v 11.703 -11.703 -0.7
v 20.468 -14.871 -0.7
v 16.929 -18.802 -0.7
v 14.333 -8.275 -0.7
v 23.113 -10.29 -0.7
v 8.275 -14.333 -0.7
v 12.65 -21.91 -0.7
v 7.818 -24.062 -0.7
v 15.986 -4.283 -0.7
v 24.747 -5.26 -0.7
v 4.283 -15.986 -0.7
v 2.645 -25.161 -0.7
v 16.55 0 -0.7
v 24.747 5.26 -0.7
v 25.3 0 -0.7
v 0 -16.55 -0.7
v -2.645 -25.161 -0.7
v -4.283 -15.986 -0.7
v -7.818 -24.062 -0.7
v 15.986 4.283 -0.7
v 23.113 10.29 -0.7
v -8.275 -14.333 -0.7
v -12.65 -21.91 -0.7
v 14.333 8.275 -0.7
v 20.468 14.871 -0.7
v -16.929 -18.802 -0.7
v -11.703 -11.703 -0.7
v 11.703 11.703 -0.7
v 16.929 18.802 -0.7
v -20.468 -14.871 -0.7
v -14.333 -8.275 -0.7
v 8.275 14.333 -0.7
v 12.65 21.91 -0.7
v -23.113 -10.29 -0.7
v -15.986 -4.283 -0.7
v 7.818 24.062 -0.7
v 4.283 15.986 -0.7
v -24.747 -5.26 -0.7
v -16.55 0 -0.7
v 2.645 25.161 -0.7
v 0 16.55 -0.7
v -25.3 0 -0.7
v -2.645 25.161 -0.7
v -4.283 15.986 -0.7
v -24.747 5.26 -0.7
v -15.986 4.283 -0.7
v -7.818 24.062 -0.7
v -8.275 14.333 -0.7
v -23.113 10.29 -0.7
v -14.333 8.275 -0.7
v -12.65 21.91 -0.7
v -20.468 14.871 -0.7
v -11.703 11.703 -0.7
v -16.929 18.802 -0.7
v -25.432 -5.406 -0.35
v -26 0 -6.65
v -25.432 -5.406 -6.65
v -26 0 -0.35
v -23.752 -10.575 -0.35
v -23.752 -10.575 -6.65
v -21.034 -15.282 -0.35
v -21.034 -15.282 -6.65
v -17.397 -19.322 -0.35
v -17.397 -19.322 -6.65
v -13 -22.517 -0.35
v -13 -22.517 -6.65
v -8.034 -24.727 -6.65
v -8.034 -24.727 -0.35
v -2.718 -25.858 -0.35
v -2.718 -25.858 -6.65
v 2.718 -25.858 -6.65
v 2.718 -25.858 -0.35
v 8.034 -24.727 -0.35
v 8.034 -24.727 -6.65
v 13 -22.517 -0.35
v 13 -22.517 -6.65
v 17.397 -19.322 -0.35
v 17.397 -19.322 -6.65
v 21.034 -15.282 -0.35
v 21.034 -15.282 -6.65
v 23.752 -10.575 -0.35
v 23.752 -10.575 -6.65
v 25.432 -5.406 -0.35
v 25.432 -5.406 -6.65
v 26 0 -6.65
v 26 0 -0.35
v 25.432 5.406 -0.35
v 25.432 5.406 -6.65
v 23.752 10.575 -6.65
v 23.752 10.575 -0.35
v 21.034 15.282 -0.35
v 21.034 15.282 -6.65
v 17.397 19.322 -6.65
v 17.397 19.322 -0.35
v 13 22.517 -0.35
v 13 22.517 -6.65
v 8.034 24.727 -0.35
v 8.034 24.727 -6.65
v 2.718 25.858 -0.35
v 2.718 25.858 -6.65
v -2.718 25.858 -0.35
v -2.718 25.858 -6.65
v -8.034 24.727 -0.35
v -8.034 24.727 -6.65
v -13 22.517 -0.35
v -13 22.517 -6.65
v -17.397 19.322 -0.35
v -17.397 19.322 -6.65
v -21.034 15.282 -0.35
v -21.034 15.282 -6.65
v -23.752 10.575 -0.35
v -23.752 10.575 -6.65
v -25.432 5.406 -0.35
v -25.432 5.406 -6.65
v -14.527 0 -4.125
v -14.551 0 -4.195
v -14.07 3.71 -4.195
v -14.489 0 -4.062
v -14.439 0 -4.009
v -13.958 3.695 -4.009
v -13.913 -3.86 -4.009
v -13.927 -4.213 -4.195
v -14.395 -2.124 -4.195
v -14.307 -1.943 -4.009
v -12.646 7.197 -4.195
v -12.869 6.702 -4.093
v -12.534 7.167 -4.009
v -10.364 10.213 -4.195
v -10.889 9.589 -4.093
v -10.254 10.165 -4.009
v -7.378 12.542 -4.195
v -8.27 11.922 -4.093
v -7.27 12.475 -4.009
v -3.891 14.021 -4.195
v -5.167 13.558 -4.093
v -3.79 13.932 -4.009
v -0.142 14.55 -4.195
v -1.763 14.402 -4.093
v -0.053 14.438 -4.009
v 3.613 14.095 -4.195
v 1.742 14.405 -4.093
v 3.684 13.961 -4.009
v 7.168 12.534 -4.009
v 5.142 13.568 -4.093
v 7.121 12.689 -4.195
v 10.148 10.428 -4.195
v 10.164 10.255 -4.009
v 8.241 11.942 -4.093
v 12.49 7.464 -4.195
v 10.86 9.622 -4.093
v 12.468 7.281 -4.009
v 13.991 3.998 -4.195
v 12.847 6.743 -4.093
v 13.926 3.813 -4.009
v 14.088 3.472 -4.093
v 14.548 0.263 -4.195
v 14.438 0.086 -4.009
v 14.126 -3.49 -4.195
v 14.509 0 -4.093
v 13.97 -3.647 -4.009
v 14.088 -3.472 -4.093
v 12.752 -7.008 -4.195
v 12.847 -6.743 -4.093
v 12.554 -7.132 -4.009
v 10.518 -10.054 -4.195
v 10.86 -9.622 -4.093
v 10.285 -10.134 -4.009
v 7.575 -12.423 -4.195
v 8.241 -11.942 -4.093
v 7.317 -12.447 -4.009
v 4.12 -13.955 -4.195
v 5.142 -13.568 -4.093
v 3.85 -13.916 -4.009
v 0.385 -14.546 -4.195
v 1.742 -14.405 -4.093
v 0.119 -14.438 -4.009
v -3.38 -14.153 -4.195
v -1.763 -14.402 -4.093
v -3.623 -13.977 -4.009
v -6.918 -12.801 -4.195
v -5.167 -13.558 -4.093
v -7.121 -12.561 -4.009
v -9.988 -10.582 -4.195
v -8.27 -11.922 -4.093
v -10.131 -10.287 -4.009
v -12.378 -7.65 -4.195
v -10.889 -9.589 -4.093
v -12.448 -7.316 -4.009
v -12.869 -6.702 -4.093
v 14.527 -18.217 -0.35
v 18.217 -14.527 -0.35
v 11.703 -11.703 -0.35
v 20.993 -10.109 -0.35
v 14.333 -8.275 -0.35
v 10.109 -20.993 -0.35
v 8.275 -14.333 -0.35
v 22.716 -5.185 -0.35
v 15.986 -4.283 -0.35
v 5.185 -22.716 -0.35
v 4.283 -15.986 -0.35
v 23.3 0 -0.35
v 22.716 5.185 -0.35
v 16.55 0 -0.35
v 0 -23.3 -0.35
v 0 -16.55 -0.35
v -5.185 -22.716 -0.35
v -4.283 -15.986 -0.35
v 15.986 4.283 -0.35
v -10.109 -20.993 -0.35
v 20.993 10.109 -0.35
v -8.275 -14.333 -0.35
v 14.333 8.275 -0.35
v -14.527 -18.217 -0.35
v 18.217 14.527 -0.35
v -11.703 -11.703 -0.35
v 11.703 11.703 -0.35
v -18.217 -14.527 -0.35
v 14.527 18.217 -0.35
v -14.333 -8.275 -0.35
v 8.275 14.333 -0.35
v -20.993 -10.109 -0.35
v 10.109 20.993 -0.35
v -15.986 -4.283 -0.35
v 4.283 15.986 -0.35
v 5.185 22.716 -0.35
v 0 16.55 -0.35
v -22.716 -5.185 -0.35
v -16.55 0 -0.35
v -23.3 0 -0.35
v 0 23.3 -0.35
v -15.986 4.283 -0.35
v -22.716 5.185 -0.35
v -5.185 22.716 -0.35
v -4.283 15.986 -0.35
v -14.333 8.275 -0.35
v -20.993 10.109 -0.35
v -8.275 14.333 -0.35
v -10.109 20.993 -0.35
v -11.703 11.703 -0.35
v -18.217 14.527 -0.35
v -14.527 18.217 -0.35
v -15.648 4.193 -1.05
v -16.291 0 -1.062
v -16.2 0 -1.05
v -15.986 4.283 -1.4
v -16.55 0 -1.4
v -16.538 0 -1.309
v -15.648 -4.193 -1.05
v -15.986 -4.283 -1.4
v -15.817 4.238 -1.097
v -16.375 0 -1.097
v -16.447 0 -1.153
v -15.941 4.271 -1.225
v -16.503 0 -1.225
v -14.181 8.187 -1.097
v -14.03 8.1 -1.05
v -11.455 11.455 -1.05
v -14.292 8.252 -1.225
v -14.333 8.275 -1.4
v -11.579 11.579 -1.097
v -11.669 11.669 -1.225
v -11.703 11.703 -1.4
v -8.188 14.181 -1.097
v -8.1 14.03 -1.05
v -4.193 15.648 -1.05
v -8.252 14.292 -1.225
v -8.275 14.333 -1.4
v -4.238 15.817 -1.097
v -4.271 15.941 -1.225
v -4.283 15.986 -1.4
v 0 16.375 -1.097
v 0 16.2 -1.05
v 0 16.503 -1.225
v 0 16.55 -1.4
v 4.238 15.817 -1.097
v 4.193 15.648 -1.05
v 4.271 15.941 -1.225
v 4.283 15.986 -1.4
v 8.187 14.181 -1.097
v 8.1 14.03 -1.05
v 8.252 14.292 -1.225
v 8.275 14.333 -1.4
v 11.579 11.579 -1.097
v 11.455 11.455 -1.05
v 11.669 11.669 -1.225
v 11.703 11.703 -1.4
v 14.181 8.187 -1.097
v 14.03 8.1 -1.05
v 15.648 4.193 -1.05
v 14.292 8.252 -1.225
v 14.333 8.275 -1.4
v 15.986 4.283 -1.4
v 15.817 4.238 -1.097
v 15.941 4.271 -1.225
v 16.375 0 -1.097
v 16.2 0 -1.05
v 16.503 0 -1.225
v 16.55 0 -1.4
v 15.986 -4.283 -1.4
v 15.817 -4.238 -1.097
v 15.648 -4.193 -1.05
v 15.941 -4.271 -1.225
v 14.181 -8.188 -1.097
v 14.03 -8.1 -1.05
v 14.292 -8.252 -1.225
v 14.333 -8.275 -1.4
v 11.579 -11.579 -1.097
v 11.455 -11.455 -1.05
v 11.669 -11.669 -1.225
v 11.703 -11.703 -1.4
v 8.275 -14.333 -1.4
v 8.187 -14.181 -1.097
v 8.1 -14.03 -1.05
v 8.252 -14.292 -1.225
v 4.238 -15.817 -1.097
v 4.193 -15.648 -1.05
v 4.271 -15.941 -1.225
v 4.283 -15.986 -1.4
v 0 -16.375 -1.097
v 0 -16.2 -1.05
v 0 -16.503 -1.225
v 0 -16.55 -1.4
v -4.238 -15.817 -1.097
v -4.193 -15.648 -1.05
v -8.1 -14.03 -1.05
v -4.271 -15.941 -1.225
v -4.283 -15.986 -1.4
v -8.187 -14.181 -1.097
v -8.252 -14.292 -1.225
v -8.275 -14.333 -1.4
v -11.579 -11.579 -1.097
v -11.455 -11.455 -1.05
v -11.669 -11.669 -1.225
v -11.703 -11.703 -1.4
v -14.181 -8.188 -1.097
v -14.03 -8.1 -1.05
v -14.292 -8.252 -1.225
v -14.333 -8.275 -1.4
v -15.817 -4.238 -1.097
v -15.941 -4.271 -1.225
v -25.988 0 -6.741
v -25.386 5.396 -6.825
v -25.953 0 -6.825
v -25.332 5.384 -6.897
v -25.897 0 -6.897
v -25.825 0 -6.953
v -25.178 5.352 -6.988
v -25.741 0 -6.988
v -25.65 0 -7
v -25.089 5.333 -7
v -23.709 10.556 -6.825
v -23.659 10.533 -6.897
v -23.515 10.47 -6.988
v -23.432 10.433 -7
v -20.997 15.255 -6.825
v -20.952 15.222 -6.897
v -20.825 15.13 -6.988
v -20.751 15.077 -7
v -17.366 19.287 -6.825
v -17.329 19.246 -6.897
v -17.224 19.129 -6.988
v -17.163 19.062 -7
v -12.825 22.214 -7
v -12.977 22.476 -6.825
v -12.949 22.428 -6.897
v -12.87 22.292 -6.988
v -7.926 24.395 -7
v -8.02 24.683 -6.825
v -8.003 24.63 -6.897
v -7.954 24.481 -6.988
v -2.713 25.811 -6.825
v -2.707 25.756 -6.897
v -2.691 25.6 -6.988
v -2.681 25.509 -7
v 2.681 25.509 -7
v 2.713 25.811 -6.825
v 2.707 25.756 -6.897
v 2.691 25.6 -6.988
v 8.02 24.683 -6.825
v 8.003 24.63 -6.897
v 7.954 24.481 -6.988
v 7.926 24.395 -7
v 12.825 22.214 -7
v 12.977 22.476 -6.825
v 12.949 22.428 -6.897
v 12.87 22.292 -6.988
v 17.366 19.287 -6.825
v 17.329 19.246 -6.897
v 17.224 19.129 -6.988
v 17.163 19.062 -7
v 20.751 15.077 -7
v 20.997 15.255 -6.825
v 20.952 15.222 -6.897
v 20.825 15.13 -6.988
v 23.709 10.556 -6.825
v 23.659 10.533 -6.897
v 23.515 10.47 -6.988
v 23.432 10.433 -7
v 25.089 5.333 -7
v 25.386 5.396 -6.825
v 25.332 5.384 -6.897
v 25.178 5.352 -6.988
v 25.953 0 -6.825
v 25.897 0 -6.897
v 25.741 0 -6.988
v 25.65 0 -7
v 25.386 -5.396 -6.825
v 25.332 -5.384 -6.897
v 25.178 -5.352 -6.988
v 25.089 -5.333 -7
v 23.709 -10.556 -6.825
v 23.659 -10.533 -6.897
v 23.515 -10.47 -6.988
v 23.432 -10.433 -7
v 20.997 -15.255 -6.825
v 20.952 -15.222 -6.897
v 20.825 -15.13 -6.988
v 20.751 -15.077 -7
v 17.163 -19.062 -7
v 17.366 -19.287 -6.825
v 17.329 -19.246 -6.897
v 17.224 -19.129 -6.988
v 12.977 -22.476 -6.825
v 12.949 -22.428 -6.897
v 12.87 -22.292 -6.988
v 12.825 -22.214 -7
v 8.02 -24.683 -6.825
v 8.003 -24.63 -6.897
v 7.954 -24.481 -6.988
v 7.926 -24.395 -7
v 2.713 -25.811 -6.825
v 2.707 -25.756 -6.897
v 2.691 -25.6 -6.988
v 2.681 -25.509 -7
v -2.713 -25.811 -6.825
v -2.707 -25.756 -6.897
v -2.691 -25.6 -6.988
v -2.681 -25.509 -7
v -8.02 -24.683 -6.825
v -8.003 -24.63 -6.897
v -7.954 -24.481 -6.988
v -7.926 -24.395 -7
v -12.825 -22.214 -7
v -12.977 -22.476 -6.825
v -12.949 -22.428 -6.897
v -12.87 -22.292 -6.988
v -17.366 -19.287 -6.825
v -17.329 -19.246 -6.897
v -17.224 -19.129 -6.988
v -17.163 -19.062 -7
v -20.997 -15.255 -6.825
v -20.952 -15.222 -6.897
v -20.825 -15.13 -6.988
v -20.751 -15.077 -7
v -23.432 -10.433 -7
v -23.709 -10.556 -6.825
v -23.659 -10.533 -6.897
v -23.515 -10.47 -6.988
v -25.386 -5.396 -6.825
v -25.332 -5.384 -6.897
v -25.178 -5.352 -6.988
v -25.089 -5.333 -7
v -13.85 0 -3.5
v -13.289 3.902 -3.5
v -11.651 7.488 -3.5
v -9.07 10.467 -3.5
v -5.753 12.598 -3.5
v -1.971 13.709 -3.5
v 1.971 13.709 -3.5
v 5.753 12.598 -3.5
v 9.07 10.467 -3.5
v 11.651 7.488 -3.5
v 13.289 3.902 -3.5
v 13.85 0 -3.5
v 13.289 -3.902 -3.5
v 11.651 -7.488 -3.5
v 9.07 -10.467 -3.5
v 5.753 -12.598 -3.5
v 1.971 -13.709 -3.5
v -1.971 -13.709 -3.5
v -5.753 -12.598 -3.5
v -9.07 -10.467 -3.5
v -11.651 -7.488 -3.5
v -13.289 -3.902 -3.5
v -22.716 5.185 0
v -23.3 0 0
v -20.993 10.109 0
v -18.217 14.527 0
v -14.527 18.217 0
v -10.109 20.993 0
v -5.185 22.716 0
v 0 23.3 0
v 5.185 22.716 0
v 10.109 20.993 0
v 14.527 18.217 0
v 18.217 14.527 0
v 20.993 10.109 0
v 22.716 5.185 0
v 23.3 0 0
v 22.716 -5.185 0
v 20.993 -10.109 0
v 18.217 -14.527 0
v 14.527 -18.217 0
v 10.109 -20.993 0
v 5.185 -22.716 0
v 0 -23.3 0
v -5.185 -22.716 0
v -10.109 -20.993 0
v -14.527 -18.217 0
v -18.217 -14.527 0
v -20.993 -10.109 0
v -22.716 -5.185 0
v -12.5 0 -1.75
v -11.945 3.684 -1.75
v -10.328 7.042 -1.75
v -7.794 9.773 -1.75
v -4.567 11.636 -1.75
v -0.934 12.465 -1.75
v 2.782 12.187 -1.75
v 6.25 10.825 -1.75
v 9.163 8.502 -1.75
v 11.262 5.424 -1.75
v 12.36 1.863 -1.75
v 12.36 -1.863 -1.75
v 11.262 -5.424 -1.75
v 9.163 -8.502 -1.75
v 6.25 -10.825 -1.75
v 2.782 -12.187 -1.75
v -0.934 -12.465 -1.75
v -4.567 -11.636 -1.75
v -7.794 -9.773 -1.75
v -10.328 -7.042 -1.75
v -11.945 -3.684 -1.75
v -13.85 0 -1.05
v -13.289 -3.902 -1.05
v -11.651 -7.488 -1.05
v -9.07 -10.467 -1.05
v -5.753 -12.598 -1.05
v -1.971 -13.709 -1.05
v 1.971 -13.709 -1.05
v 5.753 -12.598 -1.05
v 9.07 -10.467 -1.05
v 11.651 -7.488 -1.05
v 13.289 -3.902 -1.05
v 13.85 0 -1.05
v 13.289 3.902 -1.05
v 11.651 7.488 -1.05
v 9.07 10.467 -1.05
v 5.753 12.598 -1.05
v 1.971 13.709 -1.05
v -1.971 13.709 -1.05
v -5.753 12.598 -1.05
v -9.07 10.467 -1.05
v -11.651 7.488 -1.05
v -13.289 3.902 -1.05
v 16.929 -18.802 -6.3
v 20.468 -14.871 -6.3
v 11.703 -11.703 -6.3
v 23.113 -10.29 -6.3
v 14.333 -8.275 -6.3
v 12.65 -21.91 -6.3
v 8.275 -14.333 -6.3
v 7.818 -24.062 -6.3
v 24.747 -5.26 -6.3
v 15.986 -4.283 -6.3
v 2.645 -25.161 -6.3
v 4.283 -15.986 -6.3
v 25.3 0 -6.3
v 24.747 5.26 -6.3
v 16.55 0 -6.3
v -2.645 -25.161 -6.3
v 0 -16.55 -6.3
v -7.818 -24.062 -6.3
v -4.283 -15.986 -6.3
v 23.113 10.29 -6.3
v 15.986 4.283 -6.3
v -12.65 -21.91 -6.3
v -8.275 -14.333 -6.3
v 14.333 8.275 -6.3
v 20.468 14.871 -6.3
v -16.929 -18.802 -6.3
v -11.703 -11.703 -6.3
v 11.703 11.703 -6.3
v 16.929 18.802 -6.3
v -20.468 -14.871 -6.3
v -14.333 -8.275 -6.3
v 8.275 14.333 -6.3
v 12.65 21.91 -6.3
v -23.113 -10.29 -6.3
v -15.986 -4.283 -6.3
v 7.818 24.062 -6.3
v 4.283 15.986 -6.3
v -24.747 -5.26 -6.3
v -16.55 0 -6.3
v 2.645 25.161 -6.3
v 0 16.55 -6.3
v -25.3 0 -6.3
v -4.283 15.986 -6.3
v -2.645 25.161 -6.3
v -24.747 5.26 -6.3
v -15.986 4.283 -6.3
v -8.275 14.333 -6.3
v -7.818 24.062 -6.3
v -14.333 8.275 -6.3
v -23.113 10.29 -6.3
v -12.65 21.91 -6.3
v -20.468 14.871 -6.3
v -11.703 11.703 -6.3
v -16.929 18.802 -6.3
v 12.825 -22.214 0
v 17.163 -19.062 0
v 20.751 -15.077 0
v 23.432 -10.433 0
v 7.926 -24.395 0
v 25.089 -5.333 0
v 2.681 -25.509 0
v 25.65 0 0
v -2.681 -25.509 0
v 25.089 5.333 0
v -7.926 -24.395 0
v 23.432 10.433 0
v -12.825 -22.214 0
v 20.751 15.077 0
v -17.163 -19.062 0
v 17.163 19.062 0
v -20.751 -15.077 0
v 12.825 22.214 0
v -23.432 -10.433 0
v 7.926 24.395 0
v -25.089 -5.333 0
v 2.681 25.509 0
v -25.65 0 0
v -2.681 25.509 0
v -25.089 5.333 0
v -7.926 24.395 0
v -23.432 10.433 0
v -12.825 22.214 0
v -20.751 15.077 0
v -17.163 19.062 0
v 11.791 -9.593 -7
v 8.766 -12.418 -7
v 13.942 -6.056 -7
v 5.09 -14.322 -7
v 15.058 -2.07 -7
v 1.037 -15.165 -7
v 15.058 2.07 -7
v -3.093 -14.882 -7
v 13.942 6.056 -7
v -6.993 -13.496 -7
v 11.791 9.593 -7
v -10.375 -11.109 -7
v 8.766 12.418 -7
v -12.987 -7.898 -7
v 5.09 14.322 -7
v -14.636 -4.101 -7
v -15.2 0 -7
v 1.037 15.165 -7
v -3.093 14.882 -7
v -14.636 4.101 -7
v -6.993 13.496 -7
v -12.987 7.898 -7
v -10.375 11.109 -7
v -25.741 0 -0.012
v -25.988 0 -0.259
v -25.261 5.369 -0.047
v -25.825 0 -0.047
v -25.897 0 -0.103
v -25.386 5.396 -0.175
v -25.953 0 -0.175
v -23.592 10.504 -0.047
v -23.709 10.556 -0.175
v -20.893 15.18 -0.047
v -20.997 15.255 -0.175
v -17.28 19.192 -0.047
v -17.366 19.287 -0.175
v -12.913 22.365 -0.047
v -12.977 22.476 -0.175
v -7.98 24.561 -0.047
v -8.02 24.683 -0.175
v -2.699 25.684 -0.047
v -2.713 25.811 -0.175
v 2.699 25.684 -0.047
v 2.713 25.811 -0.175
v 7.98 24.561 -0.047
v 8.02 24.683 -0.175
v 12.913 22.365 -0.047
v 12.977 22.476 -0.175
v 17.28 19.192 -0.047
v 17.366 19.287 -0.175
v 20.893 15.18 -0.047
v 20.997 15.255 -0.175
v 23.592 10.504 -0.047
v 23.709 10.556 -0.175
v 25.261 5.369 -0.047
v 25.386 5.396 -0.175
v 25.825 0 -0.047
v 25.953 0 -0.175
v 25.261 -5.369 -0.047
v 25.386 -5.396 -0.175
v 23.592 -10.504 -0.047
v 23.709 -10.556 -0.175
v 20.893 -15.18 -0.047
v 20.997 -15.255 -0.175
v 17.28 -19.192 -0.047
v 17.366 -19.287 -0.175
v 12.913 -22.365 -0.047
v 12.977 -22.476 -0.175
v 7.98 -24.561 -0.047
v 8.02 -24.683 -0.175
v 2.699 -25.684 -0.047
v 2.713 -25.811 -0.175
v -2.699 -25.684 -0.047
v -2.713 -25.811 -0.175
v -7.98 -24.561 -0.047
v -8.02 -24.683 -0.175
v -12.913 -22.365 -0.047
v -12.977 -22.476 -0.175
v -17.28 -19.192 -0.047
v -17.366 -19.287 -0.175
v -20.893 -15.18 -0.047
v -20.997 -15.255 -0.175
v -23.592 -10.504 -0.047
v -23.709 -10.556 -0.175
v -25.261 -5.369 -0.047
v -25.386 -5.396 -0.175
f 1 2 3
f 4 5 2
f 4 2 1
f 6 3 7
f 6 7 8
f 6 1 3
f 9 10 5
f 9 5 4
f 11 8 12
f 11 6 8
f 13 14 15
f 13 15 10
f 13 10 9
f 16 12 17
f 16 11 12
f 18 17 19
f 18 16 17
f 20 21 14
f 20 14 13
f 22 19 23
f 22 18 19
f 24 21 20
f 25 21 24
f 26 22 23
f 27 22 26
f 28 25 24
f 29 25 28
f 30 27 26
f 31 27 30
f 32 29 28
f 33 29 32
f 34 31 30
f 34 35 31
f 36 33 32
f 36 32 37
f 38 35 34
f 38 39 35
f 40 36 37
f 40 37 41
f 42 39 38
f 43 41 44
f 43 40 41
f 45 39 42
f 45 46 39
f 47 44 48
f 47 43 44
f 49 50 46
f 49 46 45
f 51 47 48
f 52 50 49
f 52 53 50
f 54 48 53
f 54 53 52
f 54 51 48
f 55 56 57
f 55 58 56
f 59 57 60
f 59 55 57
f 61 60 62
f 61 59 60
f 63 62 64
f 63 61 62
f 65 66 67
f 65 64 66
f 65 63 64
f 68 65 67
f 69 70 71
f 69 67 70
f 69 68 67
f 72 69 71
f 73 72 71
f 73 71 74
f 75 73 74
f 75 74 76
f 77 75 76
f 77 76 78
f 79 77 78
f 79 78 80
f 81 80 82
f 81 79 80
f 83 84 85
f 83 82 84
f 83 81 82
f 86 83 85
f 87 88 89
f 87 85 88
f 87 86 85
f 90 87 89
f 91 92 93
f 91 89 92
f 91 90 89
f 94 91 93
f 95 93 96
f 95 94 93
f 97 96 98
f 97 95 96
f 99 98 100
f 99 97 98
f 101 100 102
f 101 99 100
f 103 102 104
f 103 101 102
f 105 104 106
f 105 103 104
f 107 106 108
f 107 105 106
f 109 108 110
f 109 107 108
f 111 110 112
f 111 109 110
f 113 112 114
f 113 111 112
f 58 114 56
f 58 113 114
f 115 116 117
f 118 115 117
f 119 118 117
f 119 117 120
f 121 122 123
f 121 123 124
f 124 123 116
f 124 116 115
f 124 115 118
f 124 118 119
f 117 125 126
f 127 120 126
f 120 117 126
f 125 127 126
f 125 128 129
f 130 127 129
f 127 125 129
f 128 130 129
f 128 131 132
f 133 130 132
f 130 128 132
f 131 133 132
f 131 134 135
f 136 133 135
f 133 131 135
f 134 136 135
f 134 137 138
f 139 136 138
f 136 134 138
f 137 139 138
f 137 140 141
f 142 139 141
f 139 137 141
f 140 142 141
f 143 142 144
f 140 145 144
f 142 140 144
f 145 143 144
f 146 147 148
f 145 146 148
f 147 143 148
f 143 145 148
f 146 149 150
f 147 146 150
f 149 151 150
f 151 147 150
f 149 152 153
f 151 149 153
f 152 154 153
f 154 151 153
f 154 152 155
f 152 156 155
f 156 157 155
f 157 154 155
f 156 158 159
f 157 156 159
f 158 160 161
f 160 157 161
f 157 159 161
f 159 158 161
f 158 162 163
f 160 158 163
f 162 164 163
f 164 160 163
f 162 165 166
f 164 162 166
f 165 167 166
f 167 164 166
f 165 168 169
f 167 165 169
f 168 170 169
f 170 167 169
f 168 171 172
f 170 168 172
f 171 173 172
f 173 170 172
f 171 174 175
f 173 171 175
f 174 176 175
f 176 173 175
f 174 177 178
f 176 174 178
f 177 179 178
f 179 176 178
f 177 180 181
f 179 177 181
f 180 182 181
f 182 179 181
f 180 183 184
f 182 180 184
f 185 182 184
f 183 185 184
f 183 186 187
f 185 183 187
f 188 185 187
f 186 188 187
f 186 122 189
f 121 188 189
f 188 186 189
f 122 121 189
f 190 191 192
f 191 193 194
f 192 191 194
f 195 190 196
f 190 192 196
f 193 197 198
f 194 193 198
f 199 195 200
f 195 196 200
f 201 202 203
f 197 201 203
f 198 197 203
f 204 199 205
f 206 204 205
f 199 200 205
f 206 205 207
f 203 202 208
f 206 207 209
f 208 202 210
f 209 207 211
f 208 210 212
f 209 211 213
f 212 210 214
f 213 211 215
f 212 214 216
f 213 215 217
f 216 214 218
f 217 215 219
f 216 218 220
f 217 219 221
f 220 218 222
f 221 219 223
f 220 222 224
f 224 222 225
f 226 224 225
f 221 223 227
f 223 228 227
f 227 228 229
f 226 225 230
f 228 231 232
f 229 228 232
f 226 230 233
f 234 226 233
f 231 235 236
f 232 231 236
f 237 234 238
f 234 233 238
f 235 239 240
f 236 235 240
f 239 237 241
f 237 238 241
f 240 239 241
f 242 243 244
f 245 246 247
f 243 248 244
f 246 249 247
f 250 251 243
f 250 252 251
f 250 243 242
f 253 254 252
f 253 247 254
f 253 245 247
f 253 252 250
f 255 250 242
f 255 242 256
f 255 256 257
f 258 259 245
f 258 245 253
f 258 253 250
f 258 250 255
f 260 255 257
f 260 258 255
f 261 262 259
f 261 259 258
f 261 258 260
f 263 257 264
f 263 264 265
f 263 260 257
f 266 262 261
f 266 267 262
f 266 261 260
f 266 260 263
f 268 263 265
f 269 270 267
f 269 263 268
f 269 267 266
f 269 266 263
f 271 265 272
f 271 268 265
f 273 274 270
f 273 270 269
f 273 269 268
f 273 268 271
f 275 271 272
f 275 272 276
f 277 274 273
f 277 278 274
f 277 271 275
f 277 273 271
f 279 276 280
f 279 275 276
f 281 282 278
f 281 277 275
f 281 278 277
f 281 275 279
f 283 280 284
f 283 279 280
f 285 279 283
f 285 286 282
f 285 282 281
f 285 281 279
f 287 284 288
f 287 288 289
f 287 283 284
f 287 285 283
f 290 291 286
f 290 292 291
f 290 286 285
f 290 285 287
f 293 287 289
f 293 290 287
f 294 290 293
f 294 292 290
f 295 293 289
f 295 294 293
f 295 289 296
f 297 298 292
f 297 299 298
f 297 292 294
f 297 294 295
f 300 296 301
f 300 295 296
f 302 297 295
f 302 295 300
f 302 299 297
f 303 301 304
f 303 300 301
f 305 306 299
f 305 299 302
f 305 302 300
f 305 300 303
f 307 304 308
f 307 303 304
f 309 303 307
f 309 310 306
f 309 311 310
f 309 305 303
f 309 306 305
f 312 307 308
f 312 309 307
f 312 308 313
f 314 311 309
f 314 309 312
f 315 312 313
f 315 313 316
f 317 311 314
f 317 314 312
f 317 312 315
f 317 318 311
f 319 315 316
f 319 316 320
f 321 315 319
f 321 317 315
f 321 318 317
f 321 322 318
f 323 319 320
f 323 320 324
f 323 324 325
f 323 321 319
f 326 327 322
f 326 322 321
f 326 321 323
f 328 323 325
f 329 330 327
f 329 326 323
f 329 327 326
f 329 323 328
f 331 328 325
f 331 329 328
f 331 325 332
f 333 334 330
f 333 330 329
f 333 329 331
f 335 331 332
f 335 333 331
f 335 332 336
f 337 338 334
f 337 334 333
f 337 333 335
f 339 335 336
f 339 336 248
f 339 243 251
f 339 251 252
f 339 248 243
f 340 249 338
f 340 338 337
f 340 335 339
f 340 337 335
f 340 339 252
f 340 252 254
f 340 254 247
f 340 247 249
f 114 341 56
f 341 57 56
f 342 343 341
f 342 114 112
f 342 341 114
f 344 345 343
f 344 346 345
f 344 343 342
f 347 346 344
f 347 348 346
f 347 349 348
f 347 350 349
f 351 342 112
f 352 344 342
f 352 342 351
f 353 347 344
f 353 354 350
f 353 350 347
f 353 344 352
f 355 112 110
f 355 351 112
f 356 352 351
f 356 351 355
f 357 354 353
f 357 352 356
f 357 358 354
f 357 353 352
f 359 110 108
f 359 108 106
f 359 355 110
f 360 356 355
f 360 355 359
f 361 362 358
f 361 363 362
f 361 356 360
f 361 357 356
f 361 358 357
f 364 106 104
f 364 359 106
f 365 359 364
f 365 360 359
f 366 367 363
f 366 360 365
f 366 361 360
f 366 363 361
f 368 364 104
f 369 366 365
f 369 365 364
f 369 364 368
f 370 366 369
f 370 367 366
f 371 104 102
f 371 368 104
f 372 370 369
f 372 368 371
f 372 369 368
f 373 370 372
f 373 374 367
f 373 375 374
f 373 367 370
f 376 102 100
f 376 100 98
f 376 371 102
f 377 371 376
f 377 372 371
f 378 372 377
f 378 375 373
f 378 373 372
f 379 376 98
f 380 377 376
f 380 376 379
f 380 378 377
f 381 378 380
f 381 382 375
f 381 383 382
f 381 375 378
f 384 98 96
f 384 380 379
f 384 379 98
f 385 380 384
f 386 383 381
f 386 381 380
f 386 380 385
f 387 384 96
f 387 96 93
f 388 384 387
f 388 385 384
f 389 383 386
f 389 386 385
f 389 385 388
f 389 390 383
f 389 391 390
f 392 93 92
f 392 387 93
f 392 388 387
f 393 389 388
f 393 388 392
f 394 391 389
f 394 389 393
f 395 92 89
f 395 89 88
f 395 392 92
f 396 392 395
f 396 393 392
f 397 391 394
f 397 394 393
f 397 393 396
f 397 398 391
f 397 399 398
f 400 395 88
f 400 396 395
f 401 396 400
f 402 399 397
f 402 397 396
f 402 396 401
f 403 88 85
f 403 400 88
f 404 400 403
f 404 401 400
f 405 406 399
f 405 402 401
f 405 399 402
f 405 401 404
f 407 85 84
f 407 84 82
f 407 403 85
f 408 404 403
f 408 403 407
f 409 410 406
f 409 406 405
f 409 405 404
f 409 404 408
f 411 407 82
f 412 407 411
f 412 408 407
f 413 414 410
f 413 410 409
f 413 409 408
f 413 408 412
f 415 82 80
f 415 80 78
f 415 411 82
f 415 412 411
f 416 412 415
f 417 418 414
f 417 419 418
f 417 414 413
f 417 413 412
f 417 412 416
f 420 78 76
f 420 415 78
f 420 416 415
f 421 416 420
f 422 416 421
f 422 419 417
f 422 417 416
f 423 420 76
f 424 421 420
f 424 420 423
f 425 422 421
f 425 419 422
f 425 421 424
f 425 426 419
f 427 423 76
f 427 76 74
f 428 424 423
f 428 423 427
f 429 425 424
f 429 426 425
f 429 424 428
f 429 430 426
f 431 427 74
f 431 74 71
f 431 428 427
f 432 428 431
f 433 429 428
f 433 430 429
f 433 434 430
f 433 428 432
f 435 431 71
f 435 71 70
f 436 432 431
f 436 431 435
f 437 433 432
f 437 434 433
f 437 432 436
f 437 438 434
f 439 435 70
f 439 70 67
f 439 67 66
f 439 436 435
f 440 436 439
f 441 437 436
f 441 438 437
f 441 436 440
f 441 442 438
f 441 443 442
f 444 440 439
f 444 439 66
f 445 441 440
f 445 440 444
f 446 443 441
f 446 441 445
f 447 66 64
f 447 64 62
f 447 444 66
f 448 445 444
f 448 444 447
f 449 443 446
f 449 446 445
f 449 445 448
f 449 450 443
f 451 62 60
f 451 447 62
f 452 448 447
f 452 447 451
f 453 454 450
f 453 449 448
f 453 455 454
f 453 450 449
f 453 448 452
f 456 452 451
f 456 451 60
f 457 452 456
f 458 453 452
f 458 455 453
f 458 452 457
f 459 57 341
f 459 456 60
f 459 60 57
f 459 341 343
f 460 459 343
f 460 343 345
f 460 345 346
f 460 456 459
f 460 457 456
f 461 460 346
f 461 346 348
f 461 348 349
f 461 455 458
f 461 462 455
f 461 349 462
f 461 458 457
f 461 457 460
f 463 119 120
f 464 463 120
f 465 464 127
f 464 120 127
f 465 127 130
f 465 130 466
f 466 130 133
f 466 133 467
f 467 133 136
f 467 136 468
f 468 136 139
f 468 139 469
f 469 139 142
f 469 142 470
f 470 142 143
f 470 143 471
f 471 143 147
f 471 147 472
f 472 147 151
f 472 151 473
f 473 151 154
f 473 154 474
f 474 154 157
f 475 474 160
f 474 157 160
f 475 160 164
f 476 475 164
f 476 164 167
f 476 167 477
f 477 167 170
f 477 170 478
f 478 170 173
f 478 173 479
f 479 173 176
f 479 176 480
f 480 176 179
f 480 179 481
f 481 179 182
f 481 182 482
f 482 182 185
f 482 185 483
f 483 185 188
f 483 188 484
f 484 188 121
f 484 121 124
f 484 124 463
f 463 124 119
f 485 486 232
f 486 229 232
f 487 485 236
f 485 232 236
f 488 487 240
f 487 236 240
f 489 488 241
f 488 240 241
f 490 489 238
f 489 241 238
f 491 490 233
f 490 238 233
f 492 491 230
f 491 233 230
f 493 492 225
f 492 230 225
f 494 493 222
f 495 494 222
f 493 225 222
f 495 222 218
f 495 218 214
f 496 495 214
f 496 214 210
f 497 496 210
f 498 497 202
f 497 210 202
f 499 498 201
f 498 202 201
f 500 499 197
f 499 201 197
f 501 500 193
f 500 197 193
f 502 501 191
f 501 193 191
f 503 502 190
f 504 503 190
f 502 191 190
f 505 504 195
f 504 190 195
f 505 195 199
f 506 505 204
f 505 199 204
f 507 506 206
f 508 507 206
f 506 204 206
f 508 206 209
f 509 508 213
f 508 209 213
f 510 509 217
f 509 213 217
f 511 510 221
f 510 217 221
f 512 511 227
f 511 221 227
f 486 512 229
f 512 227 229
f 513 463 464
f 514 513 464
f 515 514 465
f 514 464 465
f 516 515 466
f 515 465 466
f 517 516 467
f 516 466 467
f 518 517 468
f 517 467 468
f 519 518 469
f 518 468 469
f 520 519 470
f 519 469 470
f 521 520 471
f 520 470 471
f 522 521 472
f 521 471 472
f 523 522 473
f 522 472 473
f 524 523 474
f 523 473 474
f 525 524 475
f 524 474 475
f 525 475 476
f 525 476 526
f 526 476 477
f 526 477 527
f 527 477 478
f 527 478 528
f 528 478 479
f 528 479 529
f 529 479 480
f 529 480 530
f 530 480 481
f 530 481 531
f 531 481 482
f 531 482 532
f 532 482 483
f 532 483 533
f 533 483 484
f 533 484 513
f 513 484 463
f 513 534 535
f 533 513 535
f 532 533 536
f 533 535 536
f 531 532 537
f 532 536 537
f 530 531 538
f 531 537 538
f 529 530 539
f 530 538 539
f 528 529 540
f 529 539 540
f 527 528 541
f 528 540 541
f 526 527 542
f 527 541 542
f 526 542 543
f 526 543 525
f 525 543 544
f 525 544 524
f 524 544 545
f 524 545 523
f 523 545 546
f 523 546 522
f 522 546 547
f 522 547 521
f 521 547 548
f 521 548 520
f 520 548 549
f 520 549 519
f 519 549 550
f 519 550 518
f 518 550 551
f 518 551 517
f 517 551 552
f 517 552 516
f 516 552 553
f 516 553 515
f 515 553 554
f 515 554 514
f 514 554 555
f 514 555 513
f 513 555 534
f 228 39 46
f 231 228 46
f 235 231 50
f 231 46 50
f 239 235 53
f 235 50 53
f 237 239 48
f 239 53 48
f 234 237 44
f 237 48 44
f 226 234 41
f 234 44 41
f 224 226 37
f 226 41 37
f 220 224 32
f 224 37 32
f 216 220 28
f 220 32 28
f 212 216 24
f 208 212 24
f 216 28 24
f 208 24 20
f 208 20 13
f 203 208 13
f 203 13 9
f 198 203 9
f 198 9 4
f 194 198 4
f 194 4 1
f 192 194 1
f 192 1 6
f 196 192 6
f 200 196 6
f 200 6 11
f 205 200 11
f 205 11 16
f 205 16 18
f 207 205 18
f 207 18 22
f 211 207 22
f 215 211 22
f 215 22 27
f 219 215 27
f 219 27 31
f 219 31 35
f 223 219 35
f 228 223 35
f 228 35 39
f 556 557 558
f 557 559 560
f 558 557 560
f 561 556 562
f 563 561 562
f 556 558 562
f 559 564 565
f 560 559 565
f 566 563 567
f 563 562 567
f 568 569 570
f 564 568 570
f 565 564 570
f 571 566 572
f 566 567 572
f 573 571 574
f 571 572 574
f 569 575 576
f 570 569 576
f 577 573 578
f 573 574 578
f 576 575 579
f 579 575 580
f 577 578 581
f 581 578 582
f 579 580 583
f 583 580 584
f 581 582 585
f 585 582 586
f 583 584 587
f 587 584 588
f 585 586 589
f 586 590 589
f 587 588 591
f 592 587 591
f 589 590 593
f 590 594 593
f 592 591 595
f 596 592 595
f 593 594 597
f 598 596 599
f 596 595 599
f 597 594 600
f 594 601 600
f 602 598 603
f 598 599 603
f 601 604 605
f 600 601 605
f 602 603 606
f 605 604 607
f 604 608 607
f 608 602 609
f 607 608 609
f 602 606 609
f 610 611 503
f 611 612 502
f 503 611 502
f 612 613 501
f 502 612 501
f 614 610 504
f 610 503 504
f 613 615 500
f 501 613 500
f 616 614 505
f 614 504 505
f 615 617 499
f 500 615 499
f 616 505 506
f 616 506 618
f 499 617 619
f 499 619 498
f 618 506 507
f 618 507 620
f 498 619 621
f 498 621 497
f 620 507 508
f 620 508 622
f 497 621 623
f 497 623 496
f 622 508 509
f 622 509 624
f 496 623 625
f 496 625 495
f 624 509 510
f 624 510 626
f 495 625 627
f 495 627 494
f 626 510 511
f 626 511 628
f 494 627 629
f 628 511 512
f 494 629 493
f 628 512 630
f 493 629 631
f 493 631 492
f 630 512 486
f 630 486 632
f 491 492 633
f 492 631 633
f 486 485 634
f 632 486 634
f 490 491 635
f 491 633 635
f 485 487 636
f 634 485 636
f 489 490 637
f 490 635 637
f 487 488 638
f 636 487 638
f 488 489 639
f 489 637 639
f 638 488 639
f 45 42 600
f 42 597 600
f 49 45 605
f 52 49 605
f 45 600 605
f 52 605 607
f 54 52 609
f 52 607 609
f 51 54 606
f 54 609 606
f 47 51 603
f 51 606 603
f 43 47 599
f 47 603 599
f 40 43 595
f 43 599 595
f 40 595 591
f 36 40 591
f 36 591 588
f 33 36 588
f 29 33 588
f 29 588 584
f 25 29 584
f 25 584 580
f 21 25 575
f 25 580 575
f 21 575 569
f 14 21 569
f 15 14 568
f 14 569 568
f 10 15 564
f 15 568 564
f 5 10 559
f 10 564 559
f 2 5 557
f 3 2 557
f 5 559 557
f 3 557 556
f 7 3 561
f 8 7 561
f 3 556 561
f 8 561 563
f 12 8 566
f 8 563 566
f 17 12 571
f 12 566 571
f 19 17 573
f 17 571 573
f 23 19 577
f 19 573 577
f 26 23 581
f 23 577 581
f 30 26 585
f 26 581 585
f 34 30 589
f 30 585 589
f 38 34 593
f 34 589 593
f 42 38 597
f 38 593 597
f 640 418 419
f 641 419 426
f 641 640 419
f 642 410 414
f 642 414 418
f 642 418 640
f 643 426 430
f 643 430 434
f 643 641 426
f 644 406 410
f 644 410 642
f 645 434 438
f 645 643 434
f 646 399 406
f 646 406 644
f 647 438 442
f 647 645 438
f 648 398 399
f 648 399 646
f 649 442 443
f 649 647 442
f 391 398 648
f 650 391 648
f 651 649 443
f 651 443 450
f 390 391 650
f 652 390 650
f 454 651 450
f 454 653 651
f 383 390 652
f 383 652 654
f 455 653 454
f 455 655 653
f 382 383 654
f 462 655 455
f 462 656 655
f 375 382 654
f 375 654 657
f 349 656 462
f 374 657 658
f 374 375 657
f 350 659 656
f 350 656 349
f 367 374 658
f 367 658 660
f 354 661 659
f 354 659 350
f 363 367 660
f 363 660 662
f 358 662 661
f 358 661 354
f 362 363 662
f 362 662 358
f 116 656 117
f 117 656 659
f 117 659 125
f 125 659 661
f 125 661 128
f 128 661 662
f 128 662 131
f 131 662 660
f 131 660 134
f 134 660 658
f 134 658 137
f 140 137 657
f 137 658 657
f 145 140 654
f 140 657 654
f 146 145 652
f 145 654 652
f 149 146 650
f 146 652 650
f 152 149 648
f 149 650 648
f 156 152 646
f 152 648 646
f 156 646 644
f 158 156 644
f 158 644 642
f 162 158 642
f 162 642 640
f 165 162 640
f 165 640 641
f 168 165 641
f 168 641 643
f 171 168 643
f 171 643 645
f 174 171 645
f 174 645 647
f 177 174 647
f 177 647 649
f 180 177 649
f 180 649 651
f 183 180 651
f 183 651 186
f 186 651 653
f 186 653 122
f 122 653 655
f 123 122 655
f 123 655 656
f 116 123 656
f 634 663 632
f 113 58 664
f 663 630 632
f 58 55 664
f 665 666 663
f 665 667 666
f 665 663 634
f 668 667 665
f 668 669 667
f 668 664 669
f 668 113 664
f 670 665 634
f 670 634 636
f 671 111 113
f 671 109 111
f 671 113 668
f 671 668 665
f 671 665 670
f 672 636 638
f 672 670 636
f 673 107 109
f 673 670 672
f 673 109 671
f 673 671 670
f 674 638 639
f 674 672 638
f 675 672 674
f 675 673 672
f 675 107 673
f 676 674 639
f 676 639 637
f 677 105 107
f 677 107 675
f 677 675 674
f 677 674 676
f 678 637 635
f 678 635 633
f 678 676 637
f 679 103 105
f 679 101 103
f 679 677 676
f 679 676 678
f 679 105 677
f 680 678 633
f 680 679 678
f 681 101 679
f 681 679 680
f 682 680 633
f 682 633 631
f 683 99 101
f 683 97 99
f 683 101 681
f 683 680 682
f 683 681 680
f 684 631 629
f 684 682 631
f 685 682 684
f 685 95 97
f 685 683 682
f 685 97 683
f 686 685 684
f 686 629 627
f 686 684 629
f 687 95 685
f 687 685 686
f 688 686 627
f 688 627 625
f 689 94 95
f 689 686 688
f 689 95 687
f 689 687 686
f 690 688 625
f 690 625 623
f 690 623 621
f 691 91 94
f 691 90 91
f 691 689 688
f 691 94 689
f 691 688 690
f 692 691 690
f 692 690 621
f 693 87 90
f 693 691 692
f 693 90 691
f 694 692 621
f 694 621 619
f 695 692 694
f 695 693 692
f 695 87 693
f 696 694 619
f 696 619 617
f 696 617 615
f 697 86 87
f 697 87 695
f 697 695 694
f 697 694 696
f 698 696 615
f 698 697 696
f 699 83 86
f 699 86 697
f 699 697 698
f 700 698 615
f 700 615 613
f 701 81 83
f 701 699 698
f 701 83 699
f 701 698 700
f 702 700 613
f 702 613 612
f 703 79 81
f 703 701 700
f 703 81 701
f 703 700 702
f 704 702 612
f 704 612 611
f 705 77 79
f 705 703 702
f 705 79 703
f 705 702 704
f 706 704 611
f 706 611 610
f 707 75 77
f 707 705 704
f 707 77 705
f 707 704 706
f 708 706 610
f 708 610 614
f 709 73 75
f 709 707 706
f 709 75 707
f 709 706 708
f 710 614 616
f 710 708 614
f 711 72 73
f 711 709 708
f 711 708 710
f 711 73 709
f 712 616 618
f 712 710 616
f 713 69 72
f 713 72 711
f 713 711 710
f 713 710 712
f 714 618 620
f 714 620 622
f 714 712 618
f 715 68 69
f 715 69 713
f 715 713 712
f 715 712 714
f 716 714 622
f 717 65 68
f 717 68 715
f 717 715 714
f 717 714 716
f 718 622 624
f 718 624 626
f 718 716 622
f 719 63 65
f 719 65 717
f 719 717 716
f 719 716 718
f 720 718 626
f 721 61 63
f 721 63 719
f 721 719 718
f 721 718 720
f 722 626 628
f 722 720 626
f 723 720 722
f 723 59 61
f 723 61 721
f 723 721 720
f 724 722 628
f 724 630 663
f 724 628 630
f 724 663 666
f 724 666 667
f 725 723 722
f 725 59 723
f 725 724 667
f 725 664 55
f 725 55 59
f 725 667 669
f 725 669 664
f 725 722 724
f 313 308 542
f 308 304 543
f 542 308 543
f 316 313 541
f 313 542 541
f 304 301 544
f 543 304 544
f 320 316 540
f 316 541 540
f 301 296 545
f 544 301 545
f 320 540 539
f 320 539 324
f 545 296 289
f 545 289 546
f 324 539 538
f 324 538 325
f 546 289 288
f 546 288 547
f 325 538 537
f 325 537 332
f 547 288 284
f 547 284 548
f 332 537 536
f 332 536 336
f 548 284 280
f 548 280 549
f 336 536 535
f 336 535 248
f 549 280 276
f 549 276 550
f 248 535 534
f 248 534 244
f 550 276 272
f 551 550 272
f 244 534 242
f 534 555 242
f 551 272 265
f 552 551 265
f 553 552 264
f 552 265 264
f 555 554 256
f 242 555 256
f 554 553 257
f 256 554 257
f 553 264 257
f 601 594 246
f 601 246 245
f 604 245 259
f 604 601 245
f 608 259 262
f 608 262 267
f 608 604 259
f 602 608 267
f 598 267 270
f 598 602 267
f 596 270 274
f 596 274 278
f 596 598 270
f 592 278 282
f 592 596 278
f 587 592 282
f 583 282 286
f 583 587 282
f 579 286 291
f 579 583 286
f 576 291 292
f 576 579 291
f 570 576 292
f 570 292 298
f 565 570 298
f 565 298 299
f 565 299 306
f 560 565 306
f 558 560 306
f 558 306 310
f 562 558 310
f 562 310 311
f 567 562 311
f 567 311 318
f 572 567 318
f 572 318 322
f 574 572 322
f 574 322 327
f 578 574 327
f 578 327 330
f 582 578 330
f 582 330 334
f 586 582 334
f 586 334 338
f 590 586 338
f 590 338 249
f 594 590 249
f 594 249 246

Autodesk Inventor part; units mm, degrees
ref_plane "YZ Plane" through (0, 0, 0) normal (1, 0, 0) x (0, 1, 0)
ref_plane "WorkPlane2" through (0, 0, 0) normal (0, 0, 1) x (1, 0, 0)
sketch "Sketch1" plane through (0, 0, 0) normal (0, 1, 0) x (-1, 0, 0)
  point P0 (0, 0)
ref_plane "WorkPlane3" through (0, 0, -7) normal (0, 0, 1) x (1, 0, 0)
sketch "Sketch2" plane through (0, 0, 0) normal (0, 1, 0) x (-1, 0, 0)
  line L0 (16.55, -0.7) -> (25.3, -0.7)
  line L1 (16.55, -0.35) -> (16.55, -0.7)
  line L2 (23.3, -0.35) -> (16.55, -0.35)
  line L3 (23.3, 0) -> (23.3, -0.35)
  line L4 (26, 0) -> (23.3, 0)
  line L5 (26, -7) -> (26, 0)
  line L6 (15.2, -7) -> (26, -7)
  line L7 (14.525, -4.0833) -> (15.2, -7)
  line L8 (13.85, -3.5) -> (14.525, -4.0833)
  line L9 (12.5, -1.75) -> (13.85, -3.5)
  line L10 (13.85, -1.05) -> (12.5, -1.75)
  line L11 (16.55, -1.05) -> (13.85, -1.05)
  line L12 (16.55, -1.05) -> (16.55, -6.3)
  line L13 (25.3, -6.3) -> (16.55, -6.3)
  line L14 (25.3, -0.7) -> (25.3, -6.3)
  line L15 (0, -15.959) -> (0, -1.7548) construction
  line L16 (0, -15.959) -> (0, -1.7548)
  line L17 (0, -19.1509) -> (0, 3.1918) projected
  line L18 (-5.2, 0) -> (31.2, 0) projected
  dimension "d2" = 7
  dimension "d4" = 0.35
  dimension "d6" = 0.35
  dimension "d8" = 0.35
  dimension "d10" = 0.7
  dimension "d12" = 0.7
  dimension "d14" = 2.7
  dimension "d16" = 2.7
  dimension "d18" = 2.9167
  dimension "d20" = 1.75
  dimension "d22" = 1.35
  dimension "d24" = 0.7
  dimension "d26" = 0.675
  dimension "d28" = 1.35
  dimension "d30" = 0.675
  dimension "msp_d33" = 25
  dimension "msp_d34" = 52
revolve "Revolution1" add sketch "Sketch2" angle 360 about axis through (0, 0, -15.959) along (0, 0, -1)
fillet "Fillet1" radius 0.35 4 edges at (26, 0, 0) (26, 0, -7) (14.525, 0, -4.0833) (16.55, 0, -1.05)
equation "\"d32\" = 0.05 * b"
equation "\"d2\" = b"
equation "\"d4\" = 0.05 * b"
equation "\"d6\" = 0.05 * b"
equation "\"d8\" = 0.05 * b"
equation "\"d10\" = 0.1 * b"
equation "\"d12\" = 0.1 * b"
equation "\"d14\" = 0.1 * dd - 0.1 * Diam"
equation "\"d16\" = 0.1 * dd - 0.1 * Diam"
equation "\"d18\" = 0.416667 * b"
equation "\"d20\" = 0.25 * b"
equation "\"d22\" = 0.05 * dd - 0.05 * Diam"
equation "\"d24\" = 0.1 * b"
equation "\"d26\" = 0.025 * dd - 0.025 * Diam"
equation "\"d28\" = 0.05 * dd - 0.05 * Diam"
equation "\"d30\" = 0.025 * dd - 0.025 * Diam"
equation "\"msp_d33\" = Diam"
equation "\"msp_d34\" = dd"
equation "\"dd\" = 52"
equation "\"Diam\" = 25"
properties part number "IS0 6194/1 - 25x52x7-Type 3" material "Rubber"
